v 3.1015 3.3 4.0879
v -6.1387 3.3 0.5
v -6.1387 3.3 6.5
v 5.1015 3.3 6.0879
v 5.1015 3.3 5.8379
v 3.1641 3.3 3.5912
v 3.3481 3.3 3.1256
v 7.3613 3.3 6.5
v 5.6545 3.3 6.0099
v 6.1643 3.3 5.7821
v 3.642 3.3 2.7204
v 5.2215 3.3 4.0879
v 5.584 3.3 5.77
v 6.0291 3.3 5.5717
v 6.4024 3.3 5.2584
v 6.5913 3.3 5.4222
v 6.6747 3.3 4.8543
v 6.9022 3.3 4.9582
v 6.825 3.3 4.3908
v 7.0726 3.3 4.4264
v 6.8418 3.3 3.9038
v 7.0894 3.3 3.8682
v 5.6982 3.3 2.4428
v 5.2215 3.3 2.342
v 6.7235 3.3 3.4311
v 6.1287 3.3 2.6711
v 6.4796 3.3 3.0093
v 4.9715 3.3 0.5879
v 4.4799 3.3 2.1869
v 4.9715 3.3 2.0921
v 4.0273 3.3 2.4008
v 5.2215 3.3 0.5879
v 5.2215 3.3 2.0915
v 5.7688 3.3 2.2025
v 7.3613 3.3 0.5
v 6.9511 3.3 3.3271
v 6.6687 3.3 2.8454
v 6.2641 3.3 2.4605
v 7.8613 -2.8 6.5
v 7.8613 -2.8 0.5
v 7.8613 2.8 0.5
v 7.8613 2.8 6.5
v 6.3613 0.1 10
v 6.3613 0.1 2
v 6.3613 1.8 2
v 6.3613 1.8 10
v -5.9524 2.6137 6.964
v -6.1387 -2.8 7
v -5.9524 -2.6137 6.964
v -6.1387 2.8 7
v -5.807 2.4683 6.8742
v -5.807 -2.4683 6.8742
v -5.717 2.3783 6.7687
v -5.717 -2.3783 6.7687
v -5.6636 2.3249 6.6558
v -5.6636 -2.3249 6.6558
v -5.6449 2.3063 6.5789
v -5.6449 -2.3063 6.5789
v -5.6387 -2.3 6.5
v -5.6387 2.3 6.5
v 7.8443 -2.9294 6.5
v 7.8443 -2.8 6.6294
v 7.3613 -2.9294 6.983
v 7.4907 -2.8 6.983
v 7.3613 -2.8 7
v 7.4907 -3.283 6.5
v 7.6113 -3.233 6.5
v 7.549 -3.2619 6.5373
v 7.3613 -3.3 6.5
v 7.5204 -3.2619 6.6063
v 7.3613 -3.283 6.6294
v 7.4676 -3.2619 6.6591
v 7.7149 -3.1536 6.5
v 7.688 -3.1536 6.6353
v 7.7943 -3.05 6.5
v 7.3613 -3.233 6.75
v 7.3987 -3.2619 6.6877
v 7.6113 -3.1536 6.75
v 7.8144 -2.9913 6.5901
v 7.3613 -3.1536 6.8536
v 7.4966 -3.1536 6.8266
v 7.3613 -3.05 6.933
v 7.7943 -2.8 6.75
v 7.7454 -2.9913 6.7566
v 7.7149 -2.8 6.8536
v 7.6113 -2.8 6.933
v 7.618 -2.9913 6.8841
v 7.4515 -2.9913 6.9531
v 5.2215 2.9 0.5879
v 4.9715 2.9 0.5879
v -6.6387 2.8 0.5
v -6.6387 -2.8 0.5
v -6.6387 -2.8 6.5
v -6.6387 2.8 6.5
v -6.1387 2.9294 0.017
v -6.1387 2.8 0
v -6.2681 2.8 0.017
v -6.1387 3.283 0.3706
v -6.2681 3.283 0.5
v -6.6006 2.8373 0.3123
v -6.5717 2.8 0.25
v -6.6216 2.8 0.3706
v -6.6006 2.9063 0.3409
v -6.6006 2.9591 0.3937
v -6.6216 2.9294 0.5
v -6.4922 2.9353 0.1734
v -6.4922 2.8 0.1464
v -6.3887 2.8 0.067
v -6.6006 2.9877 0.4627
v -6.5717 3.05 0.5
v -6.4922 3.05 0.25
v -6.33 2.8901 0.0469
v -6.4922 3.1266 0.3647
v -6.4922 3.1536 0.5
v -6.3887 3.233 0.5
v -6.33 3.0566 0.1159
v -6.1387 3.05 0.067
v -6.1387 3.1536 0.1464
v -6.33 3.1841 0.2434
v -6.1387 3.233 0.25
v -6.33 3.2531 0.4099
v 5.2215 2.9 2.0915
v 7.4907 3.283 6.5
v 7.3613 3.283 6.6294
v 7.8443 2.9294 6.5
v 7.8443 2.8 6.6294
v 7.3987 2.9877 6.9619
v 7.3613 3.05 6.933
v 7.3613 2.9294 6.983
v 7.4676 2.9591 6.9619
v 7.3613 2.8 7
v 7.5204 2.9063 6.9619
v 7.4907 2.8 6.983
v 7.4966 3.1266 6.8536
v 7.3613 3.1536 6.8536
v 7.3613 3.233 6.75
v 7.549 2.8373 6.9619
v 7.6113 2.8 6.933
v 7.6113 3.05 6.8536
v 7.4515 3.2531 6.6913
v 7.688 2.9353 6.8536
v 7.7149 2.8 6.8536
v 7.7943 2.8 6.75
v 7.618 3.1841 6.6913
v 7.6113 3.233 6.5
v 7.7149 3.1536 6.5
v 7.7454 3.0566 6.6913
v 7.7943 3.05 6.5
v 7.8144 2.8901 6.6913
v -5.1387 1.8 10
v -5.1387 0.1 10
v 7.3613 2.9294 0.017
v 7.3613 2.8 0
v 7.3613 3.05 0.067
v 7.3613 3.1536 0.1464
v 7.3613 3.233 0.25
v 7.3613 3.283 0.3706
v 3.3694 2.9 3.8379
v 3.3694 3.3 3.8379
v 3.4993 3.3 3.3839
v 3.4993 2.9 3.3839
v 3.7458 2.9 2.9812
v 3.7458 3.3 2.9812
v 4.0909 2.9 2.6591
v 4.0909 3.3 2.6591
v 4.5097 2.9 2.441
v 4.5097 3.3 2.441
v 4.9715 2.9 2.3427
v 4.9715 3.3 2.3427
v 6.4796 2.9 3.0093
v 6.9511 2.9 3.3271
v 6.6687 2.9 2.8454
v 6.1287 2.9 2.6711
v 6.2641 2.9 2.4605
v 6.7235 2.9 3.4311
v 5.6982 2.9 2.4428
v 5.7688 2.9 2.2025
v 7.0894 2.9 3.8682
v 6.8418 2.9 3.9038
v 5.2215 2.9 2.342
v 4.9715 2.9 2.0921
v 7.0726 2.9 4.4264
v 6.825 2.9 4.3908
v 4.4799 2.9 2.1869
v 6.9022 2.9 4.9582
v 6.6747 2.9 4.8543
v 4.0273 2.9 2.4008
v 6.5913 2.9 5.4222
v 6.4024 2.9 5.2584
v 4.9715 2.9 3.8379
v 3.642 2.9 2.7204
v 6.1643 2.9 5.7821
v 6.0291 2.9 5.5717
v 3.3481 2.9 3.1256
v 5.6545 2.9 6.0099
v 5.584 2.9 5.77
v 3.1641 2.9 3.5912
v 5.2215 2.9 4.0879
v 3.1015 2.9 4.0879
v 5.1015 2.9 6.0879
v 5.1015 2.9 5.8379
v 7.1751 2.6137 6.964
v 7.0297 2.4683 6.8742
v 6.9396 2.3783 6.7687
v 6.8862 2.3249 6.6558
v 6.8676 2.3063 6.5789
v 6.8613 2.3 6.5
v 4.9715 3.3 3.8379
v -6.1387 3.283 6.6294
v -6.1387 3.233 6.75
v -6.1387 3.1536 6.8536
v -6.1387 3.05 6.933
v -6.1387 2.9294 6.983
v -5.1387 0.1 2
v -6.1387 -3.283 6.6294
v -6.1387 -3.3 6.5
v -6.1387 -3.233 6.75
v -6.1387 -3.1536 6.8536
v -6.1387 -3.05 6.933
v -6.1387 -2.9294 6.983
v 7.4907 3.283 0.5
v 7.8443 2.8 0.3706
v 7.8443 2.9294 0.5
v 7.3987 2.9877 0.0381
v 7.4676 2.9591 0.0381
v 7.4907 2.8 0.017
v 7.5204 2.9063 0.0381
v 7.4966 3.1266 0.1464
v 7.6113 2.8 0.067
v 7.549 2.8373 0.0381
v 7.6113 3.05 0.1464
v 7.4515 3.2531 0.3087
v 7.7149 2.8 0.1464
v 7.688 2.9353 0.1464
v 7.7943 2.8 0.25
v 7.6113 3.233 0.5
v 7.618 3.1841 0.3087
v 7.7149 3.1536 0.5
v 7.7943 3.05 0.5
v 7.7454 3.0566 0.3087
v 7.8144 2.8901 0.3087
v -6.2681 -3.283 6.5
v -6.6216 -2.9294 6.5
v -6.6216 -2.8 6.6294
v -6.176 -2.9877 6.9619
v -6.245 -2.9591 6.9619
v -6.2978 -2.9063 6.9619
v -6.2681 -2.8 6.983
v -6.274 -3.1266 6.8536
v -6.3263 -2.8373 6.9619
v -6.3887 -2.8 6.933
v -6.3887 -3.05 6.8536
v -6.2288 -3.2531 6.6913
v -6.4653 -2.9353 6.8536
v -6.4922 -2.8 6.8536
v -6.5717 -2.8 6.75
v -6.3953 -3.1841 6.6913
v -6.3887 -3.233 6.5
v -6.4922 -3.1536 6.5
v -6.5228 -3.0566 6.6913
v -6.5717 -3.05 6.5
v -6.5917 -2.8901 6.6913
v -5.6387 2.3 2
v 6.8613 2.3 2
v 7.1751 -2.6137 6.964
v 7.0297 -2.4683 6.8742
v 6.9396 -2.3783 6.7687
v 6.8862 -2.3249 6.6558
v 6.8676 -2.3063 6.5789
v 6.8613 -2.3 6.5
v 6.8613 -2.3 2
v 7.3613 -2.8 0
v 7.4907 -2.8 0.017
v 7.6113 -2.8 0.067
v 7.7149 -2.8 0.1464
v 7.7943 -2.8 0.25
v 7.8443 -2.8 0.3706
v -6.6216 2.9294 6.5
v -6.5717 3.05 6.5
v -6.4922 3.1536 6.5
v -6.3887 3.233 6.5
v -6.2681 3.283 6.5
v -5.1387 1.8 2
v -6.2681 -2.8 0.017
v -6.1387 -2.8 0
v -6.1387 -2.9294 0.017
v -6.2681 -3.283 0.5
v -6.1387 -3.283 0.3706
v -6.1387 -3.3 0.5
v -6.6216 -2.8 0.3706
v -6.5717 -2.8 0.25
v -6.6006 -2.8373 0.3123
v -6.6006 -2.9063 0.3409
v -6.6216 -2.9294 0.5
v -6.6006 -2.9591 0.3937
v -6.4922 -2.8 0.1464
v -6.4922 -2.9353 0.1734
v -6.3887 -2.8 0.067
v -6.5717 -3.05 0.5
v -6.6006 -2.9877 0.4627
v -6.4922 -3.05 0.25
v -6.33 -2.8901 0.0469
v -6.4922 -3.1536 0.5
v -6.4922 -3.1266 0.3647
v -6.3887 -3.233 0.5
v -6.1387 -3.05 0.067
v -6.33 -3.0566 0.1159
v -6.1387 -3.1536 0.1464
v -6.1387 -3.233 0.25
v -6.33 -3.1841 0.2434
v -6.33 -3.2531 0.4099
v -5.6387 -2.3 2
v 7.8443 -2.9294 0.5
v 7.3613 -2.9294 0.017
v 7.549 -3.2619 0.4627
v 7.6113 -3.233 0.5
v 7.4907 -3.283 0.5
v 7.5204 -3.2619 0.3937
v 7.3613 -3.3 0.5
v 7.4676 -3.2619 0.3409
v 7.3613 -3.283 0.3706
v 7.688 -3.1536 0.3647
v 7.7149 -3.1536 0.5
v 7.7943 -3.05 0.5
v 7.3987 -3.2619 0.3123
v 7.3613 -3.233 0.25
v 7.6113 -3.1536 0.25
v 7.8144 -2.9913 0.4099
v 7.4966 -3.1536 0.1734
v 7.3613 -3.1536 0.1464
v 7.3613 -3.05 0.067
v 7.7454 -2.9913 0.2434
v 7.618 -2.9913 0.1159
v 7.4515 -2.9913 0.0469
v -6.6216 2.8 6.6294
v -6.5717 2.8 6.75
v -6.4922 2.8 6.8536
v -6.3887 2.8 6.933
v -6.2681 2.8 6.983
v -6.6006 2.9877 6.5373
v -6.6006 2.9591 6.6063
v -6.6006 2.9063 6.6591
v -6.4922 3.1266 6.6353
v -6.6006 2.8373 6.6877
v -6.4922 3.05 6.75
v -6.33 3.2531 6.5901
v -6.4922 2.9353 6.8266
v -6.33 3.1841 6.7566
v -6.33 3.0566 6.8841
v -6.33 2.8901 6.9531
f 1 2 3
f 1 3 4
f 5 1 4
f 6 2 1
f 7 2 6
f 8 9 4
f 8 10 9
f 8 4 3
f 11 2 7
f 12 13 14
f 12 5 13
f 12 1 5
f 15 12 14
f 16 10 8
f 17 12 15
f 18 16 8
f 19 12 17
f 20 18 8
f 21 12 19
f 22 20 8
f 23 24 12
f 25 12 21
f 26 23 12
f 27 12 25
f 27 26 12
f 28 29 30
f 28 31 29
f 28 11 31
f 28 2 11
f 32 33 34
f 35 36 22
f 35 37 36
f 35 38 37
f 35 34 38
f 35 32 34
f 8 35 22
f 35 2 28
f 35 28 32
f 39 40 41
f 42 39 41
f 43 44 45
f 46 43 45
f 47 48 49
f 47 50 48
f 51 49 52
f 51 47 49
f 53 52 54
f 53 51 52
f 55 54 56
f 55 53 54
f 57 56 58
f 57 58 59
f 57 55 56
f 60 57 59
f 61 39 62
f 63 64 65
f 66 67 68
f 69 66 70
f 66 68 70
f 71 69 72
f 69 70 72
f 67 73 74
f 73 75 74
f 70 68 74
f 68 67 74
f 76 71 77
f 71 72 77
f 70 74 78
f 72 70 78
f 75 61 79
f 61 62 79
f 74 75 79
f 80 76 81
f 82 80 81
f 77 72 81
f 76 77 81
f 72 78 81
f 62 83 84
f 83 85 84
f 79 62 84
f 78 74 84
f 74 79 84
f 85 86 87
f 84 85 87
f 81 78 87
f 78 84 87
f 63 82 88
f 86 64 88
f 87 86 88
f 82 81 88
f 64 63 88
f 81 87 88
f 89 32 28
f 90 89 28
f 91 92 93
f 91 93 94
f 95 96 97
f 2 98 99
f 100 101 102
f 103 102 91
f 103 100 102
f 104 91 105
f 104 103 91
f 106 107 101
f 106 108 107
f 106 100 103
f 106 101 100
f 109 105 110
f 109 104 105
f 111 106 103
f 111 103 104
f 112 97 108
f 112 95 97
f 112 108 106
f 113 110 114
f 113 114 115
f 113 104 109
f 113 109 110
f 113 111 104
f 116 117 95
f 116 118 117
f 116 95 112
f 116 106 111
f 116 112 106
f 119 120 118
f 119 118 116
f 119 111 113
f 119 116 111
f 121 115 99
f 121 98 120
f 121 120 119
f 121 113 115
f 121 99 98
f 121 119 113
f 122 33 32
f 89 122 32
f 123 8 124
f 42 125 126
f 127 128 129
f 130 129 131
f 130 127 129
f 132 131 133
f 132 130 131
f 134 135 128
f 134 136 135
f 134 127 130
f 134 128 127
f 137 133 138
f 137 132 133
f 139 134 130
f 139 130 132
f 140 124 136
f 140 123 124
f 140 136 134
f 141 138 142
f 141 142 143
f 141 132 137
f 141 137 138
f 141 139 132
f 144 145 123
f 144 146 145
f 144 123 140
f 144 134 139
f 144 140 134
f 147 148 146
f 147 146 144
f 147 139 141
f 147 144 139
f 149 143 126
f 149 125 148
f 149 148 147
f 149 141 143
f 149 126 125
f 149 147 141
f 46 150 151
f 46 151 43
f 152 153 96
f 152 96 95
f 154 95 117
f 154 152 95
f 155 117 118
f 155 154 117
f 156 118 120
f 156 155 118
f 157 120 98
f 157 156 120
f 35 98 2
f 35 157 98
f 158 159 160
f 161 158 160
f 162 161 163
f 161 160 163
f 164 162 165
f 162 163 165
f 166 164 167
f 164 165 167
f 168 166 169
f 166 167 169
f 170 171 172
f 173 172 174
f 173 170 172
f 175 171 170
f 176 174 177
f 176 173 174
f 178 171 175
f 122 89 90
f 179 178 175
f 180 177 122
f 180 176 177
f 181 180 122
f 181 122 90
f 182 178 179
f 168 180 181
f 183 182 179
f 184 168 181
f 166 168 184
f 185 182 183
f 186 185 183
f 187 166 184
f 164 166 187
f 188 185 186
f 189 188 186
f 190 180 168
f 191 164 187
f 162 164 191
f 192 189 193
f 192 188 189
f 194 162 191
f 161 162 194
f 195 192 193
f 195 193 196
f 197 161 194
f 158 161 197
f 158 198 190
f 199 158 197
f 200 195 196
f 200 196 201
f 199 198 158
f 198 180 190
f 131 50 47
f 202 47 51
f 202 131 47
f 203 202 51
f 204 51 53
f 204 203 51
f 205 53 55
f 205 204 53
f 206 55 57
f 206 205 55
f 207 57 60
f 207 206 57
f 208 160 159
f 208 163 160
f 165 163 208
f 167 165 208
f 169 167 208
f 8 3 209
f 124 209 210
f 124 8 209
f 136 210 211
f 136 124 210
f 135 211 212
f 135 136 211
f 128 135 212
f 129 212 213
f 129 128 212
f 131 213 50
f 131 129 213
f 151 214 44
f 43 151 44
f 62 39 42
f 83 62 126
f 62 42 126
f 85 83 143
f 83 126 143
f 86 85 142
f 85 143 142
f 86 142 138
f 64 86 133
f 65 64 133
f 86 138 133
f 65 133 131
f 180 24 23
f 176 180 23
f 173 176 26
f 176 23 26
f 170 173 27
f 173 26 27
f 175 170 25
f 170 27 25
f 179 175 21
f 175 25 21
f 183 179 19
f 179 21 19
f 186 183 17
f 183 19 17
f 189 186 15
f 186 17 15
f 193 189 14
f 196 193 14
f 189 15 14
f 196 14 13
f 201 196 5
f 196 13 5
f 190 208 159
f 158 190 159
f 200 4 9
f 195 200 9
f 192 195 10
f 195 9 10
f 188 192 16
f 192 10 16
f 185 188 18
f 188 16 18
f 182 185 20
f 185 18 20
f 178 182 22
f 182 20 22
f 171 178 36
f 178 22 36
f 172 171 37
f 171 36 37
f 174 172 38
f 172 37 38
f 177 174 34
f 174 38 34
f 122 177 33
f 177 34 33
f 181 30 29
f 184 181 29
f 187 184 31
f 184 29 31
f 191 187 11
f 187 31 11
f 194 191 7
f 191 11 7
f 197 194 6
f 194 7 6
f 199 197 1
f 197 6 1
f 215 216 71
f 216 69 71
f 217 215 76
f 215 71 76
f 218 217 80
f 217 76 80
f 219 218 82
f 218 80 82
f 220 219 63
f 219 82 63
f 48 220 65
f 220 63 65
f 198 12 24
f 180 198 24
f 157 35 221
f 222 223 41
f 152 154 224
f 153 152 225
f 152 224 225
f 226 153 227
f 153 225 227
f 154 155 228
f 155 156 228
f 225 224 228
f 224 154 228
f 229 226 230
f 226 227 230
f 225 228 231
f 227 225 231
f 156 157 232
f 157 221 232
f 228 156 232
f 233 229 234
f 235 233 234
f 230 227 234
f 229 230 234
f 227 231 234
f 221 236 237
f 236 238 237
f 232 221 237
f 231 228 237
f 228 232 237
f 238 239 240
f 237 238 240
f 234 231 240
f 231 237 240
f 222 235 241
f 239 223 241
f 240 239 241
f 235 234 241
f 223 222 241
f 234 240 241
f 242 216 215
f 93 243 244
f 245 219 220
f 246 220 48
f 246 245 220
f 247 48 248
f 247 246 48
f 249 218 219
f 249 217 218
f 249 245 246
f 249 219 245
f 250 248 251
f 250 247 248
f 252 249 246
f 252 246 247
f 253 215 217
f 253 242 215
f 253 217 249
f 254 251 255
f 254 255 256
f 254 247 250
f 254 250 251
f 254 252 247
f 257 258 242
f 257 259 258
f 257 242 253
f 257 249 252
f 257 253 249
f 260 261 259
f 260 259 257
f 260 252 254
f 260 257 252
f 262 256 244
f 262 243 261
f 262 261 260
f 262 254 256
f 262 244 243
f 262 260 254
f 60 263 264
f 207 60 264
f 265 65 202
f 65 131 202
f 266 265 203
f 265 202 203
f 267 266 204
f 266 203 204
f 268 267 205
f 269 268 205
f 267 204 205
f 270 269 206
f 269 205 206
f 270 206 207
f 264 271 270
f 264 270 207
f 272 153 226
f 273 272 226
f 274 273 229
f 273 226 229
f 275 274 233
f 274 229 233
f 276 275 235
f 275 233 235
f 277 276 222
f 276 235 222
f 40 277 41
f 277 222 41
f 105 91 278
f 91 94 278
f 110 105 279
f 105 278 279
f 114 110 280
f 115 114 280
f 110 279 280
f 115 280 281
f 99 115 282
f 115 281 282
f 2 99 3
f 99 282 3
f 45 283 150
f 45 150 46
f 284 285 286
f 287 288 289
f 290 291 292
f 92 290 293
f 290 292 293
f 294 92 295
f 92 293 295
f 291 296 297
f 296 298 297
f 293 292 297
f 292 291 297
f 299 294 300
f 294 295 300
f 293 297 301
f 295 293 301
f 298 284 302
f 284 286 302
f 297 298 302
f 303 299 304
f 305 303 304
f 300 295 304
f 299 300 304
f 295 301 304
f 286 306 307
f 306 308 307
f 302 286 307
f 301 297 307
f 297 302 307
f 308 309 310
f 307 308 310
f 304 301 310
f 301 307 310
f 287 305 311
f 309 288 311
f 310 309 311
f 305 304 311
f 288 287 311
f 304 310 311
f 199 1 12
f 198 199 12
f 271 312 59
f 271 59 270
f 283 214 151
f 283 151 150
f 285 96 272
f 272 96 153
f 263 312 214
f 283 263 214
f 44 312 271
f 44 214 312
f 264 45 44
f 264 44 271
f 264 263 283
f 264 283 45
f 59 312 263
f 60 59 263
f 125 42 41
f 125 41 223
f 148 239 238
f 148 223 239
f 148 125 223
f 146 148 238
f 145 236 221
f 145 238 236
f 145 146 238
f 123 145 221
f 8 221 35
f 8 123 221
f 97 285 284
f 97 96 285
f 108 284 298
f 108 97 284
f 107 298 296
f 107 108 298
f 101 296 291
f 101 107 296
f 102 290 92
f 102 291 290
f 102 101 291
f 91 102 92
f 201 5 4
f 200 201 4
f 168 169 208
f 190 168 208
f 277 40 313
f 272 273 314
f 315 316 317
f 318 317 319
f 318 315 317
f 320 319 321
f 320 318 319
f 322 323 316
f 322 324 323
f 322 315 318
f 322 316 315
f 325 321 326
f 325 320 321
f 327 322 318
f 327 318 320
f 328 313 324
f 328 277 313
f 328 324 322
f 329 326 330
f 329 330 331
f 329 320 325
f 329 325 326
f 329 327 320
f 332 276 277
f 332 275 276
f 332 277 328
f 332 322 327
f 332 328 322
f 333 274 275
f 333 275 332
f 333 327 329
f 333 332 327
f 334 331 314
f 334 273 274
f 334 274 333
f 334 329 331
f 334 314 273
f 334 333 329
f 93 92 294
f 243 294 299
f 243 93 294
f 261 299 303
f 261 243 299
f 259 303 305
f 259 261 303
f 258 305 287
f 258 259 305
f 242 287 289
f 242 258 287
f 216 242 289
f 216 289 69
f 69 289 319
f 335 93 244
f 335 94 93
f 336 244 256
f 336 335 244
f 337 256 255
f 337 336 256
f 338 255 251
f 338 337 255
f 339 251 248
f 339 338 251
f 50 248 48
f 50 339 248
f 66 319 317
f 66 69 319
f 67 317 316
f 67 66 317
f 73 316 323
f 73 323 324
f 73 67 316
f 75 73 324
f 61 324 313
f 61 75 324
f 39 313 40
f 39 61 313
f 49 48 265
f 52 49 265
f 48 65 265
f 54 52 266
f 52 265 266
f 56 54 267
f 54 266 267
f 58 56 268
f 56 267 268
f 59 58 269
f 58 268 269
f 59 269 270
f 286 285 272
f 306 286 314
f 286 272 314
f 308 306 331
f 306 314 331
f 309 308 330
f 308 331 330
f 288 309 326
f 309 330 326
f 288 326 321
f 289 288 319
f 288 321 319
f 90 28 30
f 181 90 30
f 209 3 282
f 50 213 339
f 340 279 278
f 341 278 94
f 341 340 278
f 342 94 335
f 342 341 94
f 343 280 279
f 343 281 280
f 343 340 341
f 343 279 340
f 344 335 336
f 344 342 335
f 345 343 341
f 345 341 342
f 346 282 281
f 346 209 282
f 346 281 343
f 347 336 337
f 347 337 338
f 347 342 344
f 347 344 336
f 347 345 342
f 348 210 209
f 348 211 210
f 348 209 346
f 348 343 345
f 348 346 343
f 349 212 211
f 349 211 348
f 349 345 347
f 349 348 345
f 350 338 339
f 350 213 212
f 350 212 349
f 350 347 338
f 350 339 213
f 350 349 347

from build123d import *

# Parameters (mm, degrees)
F0_W     = 14.5
F0_H     = 6.6
F0_W_2   = 12.5
F0_H_2   = 4.6
F1_DEPTH = 7
F0_W_3   = 11.5
F0_H_3   = 1.7
F2_DEPTH = 2
F3_DEPTH = 10
F5_DEPTH = 0.4
F6_R     = 0.49999


# Not quite as in the source:
# - a fillet or chamfer is up to 0.001 mm smaller than in the source, because OpenCascade refuses the exact size


with BuildPart() as f1:
    # F0 (on Top) → F1 (new body)
    with BuildSketch(Plane.XY):
        with Locations((0.6113282288, 0)):
            Rectangle(F0_W, F0_H)
        with Locations((0.6113282288, 0)):
            Rectangle(F0_W_2, F0_H_2, mode=Mode.SUBTRACT)
    extrude(amount=F1_DEPTH)

    # F0 (on Top) → F2 (join)
    with BuildSketch(Plane.XY):
        with Locations((0.6113282288, 0)):
            Rectangle(F0_W_2, F0_H_2)
        with Locations((0.6113282288, 0.95)):
            Rectangle(F0_W_3, F0_H_3, mode=Mode.SUBTRACT)
        with Locations((0.6113282288, 0.95)):
            Rectangle(F0_W_3, F0_H_3)
    extrude(amount=F2_DEPTH)

    # F0 (on Top) → F3 (join)
    with BuildSketch(Plane.XY):
        with Locations((0.6113282288, 0.95)):
            Rectangle(F0_W_3, F0_H_3)
    extrude(amount=F3_DEPTH)

    # F4 (on face) → F5 (cut)
    with BuildSketch(Plane(origin=(0, 3.3, 0), x_dir=(-1, 0, 0), z_dir=(0, 1, 0))):
        with BuildLine():
            Line((-5.1014683965, 5.8378594238), (-5.1014683965, 6.0878594238))
            ThreePointArc((-5.1014683965, 6.0878594238), (-7.1005673821, 4.1478864664), (-5.2214683965, 2.0914626697))
            Line((-5.2214683965, 2.0914626697), (-5.2214683965, 2.3419785573))
            ThreePointArc((-5.2214683965, 2.3419785573), (-6.8504383099, 4.1478947619), (-5.1014683965, 5.8378594238))
        make_face()
        with BuildLine():
            Line((-5.2214683965, 2.3419785573), (-5.2214683965, 2.0914626697))
            ThreePointArc((-5.2214683965, 2.0914626697), (-5.0964586021, 2.0878656984), (-4.9714683965, 2.0920888959))
            Line((-4.9714683965, 2.0920888959), (-4.9714683965, 2.3426946752))
            ThreePointArc((-4.9714683965, 2.3426946752), (-5.0964555923, 2.3378666033), (-5.2214683965, 2.3419785573))
        make_face()
        with BuildLine():
            ThreePointArc((-4.9714683965, 2.0920888959), (-5.0964586021, 2.0878656984), (-5.2214683965, 2.0914626697))
            Line((-5.2214683965, 2.0914626697), (-5.2214683965, 0.5878594238))
            Line((-5.2214683965, 0.5878594238), (-4.9714683965, 0.5878594238))
            Line((-4.9714683965, 0.5878594238), (-4.9714683965, 2.0920888959))
        make_face()
        with BuildLine():
            Line((-4.9714683965, 2.3426946752), (-4.9714683965, 2.0920888959))
            ThreePointArc((-4.9714683965, 2.0920888959), (-3.6420164446, 2.7203799907), (-3.1014683965, 4.0878594238))
            Line((-3.1014683965, 4.0878594238), (-3.3514683965, 4.0878594238))
            ThreePointArc((-3.3514683965, 4.0878594238), (-3.3559614625, 3.9625376644), (-3.3694175889, 3.8378594238))
            ThreePointArc((-3.3694175889, 3.8378594238), (-3.907446743, 2.8084797729), (-4.9714683965, 2.3426946752))
        make_face()
        with BuildLine():
            Line((-5.2214683965, 4.0878594238), (-5.2214683965, 2.3419785573))
            ThreePointArc((-5.2214683965, 2.3419785573), (-5.0964555923, 2.3378666033), (-4.9714683965, 2.3426946752))
            Line((-4.9714683965, 2.3426946752), (-4.9714683965, 3.8378594238))
            Line((-4.9714683965, 3.8378594238), (-3.3694175889, 3.8378594238))
            ThreePointArc((-3.3694175889, 3.8378594238), (-3.3559614625, 3.9625376644), (-3.3514683965, 4.0878594238))
            Line((-3.3514683965, 4.0878594238), (-5.2214683965, 4.0878594238))
        make_face()
    extrude(amount=-F5_DEPTH, mode=Mode.SUBTRACT)

    # F6 (radius 0.5 in the source; OpenCascade refuses exactly that, so slightly less here)
    f6_edges = [f1.edges().sort_by_distance(p)[0] for p in [
        (7.861328, 3.3, 3.5),
        (0.611328, 3.3, 7),
        (0.611328, 3.3, 0),
        (7.861328, 0, 0),
        (7.861328, 0, 7),
        (7.861328, -3.3, 3.5),
        (0.611328, -3.3, 0),
        (-6.638672, 0, 0),
        (-6.638672, 3.3, 3.5),
        (-6.638672, -3.3, 3.5),
        (0.611328, -3.3, 7),
        (-6.638672, 0, 7),
        (0.611328, 2.3, 7),
        (0.611328, -2.3, 7),
        (-5.638672, 0, 7),
        (6.861328, 0, 7),
    ]]
    fillet(f6_edges, radius=F6_R)


solid = f1.part
